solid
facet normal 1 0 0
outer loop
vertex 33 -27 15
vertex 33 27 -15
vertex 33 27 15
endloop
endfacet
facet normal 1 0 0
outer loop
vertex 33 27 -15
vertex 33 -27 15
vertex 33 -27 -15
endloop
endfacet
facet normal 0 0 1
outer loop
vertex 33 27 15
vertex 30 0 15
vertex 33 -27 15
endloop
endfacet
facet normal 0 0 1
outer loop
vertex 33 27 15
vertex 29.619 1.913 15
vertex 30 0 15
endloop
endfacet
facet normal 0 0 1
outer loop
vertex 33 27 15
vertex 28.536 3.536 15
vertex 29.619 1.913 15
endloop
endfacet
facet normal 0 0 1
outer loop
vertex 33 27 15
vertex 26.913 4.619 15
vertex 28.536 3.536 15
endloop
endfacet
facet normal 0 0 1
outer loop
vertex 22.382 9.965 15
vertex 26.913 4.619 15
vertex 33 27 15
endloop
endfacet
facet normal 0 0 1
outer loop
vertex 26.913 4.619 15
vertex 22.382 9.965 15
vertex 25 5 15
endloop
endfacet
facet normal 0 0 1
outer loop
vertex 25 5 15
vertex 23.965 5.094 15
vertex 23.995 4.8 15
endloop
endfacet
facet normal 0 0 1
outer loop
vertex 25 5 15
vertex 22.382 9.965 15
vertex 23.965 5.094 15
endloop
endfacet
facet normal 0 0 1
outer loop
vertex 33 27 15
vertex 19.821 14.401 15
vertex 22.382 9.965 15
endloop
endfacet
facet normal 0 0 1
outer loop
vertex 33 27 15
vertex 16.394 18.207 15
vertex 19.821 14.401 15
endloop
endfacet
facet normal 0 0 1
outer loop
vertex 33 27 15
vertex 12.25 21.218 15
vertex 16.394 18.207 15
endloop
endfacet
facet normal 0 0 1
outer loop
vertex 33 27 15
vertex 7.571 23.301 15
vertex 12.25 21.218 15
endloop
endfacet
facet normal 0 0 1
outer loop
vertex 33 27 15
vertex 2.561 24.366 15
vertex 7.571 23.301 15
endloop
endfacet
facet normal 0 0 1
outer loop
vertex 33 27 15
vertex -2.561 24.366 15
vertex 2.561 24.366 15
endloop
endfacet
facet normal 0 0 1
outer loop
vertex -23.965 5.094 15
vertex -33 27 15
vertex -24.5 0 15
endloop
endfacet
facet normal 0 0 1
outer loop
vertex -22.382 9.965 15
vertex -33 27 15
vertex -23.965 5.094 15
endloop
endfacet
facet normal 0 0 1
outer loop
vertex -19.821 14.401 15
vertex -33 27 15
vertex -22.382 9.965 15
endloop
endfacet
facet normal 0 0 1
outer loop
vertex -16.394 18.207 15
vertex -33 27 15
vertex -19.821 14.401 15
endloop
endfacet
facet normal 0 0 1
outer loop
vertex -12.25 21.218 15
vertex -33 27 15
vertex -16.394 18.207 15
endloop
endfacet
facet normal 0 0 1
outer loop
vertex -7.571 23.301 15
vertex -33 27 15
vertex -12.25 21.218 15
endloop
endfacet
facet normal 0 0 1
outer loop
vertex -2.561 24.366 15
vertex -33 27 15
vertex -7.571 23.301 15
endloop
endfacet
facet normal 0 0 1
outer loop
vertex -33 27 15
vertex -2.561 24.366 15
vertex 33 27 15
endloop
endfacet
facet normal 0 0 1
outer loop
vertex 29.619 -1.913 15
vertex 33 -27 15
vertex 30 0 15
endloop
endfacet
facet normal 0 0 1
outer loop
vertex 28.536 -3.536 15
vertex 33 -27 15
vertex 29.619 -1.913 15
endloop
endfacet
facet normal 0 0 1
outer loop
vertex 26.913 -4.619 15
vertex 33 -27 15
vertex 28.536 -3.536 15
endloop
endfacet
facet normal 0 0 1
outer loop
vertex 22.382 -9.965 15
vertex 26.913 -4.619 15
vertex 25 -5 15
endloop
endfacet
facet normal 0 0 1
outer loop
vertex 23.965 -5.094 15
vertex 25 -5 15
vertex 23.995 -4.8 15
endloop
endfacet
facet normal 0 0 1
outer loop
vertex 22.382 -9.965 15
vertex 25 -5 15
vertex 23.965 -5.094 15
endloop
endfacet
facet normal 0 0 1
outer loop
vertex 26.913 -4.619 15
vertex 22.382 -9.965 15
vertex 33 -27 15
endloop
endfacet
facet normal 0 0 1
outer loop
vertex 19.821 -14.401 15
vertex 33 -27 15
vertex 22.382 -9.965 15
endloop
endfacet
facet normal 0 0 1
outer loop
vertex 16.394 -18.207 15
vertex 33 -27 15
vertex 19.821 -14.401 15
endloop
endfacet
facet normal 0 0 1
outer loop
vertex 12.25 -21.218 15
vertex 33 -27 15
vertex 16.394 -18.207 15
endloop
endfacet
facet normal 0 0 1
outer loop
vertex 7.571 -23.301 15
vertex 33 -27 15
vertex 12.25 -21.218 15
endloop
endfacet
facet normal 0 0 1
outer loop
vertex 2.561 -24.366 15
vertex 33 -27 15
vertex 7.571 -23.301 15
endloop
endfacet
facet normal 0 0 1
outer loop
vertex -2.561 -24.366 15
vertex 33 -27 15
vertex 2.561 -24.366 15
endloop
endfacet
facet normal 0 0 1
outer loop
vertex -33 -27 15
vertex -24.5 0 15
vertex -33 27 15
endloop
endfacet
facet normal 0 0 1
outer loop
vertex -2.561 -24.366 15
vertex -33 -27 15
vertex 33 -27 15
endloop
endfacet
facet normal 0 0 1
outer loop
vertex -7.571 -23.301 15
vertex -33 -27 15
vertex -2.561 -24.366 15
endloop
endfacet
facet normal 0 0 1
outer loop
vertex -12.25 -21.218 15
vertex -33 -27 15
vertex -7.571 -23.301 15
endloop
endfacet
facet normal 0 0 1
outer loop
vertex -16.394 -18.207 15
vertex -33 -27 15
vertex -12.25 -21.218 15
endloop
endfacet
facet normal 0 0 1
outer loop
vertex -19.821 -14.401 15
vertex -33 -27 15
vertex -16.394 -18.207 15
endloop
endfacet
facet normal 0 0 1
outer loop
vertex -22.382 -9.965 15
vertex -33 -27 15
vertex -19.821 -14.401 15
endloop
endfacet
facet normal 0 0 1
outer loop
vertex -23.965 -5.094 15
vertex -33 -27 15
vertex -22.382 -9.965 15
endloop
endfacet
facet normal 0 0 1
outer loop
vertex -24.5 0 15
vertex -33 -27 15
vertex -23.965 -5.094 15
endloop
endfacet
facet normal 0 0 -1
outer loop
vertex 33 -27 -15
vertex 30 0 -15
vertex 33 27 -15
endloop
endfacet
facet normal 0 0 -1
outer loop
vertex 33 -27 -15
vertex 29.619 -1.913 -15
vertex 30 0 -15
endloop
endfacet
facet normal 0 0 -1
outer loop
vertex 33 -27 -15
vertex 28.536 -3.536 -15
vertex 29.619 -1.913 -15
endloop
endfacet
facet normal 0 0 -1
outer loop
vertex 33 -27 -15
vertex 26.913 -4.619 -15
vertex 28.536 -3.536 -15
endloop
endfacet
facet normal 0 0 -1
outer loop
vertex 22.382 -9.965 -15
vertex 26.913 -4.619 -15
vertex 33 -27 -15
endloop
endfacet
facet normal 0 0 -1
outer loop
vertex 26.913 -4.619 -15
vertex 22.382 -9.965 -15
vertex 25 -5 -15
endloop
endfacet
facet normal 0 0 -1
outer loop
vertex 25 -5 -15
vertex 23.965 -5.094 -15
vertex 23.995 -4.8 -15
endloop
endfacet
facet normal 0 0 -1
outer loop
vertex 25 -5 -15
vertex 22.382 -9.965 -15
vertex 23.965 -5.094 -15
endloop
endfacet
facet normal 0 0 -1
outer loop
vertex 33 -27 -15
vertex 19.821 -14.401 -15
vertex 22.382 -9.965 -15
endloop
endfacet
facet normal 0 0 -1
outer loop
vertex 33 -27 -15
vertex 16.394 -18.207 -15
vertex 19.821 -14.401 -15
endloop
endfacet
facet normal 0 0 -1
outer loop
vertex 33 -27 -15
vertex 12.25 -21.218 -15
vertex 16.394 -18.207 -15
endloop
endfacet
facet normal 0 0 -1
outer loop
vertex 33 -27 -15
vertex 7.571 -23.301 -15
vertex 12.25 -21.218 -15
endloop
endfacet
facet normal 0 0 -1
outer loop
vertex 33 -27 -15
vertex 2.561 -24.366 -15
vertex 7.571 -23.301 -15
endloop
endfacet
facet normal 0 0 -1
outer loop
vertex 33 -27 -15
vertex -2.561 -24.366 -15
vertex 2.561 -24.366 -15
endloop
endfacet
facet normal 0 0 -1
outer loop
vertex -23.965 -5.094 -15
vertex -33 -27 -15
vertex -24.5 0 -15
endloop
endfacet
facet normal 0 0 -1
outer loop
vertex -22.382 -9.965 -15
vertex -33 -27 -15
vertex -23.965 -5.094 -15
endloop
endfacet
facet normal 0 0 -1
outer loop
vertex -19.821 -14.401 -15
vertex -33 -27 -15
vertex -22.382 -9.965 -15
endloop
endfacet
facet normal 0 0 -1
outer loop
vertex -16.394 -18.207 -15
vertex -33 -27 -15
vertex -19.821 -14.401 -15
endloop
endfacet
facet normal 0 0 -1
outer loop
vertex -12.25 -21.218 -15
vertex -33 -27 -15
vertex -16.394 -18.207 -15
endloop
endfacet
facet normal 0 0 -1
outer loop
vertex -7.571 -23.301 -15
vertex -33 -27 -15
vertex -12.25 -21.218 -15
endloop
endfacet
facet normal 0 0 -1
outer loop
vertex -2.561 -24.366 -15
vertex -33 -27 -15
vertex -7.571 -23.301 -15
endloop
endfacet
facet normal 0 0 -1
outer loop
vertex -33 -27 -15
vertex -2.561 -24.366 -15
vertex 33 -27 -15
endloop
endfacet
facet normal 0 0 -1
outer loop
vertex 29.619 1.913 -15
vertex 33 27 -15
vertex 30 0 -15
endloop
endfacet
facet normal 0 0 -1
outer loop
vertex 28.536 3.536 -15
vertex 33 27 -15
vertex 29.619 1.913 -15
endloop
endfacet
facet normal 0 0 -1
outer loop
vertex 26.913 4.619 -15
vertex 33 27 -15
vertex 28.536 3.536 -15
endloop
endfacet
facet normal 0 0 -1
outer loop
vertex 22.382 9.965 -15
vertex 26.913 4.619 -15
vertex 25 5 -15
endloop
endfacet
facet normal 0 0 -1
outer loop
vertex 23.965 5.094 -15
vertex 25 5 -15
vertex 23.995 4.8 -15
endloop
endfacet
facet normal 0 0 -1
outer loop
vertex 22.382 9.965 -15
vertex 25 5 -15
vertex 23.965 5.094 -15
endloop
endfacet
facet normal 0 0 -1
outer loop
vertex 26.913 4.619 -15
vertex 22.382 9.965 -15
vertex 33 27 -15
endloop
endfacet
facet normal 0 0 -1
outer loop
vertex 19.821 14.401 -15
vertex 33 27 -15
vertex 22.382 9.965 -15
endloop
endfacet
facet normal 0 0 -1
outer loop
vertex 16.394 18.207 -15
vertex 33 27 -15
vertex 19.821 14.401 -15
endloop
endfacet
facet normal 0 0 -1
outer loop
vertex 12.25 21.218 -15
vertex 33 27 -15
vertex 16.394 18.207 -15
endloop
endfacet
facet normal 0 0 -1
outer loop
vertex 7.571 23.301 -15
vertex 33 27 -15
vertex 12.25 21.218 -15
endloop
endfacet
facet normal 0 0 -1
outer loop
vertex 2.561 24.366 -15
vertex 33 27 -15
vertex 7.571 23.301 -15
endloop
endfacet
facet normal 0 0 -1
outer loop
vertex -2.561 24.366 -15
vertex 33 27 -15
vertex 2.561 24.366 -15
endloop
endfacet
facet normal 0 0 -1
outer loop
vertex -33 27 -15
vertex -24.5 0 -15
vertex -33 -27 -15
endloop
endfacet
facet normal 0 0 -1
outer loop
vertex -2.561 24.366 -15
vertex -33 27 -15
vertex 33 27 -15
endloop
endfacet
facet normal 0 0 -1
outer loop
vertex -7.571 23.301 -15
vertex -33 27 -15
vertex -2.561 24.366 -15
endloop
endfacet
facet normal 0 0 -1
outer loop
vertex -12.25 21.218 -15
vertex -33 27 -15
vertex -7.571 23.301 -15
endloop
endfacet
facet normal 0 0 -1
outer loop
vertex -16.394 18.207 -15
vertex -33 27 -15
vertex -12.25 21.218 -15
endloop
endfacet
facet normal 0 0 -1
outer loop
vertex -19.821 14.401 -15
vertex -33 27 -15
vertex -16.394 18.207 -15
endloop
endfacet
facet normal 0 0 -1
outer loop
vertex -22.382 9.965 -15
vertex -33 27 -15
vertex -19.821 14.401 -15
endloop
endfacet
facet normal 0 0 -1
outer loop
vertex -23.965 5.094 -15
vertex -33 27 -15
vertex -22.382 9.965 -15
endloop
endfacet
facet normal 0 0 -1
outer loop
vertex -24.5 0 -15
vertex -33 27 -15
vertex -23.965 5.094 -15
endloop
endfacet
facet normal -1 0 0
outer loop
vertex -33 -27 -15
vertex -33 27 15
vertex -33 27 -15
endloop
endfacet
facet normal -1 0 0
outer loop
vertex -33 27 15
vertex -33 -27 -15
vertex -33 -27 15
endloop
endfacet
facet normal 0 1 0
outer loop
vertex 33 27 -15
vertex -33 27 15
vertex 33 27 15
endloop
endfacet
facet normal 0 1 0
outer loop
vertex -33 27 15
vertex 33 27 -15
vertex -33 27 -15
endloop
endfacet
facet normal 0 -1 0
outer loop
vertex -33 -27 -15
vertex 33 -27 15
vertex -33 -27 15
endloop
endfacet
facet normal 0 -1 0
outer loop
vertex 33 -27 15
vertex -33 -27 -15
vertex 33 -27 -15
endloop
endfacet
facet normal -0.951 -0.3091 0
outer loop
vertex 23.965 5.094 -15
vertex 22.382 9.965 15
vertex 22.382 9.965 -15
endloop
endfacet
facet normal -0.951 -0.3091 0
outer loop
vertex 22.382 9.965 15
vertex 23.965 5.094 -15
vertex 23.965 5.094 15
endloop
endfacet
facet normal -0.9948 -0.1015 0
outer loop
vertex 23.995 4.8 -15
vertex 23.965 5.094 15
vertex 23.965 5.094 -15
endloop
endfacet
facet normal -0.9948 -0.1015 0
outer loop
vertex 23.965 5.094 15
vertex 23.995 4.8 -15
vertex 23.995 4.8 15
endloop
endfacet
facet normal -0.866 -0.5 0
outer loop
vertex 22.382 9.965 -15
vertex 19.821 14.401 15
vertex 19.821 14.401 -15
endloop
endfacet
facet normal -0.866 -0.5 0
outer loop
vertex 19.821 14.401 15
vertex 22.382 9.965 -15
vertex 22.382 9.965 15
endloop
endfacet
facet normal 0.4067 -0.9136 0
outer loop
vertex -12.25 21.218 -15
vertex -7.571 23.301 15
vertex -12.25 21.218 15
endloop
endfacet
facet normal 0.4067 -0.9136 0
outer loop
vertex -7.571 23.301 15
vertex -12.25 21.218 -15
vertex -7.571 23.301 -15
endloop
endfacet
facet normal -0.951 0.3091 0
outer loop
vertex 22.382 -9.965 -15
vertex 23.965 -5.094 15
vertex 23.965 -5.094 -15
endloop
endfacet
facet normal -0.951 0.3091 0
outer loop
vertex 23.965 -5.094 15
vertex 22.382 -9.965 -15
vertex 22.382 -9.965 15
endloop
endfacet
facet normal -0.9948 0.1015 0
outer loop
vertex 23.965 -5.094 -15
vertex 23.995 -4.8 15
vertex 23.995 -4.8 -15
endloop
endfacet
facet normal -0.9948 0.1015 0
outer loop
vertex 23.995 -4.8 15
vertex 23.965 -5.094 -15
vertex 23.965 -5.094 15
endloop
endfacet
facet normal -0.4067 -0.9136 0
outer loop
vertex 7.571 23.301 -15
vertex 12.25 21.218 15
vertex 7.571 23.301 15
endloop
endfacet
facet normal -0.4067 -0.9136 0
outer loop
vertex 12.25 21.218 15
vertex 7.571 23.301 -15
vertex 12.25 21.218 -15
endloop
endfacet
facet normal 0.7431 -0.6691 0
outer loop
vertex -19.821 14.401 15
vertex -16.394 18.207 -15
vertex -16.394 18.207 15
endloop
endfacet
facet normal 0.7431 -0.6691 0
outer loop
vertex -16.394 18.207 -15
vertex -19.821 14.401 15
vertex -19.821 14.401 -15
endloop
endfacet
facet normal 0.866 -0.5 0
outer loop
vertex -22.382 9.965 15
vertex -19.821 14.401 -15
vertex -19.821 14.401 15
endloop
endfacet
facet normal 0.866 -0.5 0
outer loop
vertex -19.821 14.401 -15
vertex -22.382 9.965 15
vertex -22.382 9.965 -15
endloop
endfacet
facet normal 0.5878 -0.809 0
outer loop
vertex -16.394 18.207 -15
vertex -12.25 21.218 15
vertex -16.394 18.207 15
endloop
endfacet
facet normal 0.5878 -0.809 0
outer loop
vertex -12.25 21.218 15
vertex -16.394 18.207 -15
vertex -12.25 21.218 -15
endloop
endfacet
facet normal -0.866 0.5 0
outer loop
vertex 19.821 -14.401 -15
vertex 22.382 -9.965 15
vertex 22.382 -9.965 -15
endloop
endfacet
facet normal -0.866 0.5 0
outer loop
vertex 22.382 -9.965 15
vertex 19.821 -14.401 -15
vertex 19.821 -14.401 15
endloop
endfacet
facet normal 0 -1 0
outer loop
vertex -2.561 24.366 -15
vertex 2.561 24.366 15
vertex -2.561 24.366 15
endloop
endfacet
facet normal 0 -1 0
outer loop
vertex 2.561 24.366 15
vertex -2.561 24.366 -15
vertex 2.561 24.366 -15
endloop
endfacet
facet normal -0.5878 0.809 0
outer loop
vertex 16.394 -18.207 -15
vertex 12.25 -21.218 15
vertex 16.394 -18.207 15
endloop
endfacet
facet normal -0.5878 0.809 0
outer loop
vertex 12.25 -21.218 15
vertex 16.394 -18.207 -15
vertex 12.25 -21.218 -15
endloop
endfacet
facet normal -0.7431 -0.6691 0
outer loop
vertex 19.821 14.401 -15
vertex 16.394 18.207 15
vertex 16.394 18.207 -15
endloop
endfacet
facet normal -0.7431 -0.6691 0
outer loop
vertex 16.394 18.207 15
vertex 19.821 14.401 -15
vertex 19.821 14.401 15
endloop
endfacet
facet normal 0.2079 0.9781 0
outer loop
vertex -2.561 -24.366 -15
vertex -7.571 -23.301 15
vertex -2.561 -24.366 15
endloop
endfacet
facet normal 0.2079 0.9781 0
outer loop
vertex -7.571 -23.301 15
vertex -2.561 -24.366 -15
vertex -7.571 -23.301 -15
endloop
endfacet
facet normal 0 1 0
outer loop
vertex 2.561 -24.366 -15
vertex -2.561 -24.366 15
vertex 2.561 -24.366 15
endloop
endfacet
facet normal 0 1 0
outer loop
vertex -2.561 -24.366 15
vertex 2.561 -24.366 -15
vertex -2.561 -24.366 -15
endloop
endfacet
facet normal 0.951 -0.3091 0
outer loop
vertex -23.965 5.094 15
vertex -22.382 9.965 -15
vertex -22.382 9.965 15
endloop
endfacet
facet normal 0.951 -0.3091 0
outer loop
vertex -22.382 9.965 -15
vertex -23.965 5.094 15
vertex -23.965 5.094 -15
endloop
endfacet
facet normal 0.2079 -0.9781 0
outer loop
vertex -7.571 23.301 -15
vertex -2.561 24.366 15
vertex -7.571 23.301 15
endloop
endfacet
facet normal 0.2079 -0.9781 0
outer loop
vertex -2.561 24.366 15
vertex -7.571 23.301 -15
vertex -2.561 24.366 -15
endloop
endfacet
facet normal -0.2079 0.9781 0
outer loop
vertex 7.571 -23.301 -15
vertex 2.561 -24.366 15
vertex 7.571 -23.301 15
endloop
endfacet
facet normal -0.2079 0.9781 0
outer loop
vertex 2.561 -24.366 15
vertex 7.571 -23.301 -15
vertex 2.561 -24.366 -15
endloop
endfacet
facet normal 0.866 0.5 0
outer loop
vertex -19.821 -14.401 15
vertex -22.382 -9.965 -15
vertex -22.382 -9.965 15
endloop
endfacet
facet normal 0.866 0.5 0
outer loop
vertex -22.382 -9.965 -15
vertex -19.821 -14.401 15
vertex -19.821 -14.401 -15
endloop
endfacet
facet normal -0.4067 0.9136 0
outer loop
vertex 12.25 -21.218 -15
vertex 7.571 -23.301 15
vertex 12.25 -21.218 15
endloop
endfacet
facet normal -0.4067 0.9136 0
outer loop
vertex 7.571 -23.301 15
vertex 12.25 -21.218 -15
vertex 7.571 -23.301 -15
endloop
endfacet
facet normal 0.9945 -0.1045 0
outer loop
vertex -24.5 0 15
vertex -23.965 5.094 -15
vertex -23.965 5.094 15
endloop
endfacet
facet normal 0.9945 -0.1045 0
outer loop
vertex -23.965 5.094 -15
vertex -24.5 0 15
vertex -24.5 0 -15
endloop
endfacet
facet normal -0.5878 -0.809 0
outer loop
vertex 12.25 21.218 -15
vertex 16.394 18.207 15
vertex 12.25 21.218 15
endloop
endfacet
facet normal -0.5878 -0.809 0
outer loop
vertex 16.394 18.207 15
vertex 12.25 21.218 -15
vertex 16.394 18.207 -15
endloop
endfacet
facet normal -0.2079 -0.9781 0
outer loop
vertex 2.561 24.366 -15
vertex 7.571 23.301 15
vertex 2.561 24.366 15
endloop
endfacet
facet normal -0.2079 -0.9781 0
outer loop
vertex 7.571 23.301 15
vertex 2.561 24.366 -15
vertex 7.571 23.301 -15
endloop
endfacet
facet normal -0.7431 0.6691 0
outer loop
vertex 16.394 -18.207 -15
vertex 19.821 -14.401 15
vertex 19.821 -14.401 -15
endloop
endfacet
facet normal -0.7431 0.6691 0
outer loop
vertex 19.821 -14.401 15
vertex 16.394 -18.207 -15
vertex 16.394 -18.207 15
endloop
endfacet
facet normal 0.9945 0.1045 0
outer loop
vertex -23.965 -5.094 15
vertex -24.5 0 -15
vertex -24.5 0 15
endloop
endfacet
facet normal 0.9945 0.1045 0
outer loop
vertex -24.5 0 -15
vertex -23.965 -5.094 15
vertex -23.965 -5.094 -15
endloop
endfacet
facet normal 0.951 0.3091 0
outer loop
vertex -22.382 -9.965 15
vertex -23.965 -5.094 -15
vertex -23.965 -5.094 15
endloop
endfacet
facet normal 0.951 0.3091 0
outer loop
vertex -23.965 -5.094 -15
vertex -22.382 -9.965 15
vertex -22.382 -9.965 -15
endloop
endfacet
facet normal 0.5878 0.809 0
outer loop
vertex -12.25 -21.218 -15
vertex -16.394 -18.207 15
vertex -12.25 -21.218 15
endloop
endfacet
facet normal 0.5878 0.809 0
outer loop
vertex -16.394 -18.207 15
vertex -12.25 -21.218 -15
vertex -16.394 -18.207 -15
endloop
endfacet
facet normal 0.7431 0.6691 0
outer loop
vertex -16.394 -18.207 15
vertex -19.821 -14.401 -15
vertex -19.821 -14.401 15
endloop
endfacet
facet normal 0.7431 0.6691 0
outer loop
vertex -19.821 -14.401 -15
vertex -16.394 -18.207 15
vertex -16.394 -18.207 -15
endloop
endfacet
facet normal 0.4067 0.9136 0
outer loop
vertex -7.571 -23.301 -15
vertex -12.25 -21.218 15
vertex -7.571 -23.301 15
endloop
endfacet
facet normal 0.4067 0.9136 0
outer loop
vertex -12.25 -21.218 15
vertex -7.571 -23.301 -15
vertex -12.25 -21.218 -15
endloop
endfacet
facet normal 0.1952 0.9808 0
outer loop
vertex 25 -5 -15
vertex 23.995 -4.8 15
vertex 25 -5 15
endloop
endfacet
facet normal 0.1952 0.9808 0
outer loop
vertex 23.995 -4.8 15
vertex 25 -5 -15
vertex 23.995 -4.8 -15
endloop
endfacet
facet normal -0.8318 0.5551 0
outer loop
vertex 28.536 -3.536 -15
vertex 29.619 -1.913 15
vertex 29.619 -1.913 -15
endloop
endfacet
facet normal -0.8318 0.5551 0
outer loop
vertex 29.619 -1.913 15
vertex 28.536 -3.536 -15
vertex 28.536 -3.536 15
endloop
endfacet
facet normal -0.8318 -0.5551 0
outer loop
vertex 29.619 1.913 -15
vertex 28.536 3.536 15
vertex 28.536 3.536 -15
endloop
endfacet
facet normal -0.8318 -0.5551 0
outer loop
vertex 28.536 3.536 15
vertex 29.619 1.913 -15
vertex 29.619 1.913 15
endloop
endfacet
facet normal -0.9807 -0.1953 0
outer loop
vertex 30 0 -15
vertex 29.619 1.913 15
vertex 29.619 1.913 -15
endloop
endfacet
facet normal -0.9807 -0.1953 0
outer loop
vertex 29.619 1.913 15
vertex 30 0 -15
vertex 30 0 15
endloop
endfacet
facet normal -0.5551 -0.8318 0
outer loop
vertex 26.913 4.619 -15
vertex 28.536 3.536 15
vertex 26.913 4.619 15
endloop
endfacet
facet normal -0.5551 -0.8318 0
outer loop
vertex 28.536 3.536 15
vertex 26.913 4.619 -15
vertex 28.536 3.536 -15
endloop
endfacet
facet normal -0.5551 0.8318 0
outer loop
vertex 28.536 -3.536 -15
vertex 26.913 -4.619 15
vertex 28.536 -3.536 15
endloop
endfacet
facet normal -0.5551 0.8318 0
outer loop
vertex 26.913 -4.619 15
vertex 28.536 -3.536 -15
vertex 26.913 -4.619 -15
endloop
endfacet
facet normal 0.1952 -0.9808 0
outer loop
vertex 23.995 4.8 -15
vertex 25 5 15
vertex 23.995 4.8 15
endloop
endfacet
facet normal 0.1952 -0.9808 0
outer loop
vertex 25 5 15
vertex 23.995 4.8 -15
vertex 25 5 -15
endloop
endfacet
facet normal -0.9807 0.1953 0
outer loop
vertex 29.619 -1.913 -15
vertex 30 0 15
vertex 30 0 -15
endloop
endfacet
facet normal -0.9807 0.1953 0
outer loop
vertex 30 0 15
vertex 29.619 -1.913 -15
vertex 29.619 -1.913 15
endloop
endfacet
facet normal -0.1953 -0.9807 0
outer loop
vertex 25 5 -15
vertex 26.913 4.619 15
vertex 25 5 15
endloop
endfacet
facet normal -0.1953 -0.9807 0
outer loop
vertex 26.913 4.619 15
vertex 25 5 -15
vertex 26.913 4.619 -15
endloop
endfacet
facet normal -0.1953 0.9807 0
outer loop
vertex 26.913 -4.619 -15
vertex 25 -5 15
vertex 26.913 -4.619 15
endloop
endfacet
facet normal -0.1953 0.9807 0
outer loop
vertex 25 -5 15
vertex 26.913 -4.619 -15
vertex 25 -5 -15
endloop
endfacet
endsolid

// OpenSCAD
difference() {
    cube([66,54,30],true);
    translate([0,0,-20]) {cylinder(120,24.5,24.5);}
    translate([25,0,-20]) {cylinder(120,5,5);}
}
